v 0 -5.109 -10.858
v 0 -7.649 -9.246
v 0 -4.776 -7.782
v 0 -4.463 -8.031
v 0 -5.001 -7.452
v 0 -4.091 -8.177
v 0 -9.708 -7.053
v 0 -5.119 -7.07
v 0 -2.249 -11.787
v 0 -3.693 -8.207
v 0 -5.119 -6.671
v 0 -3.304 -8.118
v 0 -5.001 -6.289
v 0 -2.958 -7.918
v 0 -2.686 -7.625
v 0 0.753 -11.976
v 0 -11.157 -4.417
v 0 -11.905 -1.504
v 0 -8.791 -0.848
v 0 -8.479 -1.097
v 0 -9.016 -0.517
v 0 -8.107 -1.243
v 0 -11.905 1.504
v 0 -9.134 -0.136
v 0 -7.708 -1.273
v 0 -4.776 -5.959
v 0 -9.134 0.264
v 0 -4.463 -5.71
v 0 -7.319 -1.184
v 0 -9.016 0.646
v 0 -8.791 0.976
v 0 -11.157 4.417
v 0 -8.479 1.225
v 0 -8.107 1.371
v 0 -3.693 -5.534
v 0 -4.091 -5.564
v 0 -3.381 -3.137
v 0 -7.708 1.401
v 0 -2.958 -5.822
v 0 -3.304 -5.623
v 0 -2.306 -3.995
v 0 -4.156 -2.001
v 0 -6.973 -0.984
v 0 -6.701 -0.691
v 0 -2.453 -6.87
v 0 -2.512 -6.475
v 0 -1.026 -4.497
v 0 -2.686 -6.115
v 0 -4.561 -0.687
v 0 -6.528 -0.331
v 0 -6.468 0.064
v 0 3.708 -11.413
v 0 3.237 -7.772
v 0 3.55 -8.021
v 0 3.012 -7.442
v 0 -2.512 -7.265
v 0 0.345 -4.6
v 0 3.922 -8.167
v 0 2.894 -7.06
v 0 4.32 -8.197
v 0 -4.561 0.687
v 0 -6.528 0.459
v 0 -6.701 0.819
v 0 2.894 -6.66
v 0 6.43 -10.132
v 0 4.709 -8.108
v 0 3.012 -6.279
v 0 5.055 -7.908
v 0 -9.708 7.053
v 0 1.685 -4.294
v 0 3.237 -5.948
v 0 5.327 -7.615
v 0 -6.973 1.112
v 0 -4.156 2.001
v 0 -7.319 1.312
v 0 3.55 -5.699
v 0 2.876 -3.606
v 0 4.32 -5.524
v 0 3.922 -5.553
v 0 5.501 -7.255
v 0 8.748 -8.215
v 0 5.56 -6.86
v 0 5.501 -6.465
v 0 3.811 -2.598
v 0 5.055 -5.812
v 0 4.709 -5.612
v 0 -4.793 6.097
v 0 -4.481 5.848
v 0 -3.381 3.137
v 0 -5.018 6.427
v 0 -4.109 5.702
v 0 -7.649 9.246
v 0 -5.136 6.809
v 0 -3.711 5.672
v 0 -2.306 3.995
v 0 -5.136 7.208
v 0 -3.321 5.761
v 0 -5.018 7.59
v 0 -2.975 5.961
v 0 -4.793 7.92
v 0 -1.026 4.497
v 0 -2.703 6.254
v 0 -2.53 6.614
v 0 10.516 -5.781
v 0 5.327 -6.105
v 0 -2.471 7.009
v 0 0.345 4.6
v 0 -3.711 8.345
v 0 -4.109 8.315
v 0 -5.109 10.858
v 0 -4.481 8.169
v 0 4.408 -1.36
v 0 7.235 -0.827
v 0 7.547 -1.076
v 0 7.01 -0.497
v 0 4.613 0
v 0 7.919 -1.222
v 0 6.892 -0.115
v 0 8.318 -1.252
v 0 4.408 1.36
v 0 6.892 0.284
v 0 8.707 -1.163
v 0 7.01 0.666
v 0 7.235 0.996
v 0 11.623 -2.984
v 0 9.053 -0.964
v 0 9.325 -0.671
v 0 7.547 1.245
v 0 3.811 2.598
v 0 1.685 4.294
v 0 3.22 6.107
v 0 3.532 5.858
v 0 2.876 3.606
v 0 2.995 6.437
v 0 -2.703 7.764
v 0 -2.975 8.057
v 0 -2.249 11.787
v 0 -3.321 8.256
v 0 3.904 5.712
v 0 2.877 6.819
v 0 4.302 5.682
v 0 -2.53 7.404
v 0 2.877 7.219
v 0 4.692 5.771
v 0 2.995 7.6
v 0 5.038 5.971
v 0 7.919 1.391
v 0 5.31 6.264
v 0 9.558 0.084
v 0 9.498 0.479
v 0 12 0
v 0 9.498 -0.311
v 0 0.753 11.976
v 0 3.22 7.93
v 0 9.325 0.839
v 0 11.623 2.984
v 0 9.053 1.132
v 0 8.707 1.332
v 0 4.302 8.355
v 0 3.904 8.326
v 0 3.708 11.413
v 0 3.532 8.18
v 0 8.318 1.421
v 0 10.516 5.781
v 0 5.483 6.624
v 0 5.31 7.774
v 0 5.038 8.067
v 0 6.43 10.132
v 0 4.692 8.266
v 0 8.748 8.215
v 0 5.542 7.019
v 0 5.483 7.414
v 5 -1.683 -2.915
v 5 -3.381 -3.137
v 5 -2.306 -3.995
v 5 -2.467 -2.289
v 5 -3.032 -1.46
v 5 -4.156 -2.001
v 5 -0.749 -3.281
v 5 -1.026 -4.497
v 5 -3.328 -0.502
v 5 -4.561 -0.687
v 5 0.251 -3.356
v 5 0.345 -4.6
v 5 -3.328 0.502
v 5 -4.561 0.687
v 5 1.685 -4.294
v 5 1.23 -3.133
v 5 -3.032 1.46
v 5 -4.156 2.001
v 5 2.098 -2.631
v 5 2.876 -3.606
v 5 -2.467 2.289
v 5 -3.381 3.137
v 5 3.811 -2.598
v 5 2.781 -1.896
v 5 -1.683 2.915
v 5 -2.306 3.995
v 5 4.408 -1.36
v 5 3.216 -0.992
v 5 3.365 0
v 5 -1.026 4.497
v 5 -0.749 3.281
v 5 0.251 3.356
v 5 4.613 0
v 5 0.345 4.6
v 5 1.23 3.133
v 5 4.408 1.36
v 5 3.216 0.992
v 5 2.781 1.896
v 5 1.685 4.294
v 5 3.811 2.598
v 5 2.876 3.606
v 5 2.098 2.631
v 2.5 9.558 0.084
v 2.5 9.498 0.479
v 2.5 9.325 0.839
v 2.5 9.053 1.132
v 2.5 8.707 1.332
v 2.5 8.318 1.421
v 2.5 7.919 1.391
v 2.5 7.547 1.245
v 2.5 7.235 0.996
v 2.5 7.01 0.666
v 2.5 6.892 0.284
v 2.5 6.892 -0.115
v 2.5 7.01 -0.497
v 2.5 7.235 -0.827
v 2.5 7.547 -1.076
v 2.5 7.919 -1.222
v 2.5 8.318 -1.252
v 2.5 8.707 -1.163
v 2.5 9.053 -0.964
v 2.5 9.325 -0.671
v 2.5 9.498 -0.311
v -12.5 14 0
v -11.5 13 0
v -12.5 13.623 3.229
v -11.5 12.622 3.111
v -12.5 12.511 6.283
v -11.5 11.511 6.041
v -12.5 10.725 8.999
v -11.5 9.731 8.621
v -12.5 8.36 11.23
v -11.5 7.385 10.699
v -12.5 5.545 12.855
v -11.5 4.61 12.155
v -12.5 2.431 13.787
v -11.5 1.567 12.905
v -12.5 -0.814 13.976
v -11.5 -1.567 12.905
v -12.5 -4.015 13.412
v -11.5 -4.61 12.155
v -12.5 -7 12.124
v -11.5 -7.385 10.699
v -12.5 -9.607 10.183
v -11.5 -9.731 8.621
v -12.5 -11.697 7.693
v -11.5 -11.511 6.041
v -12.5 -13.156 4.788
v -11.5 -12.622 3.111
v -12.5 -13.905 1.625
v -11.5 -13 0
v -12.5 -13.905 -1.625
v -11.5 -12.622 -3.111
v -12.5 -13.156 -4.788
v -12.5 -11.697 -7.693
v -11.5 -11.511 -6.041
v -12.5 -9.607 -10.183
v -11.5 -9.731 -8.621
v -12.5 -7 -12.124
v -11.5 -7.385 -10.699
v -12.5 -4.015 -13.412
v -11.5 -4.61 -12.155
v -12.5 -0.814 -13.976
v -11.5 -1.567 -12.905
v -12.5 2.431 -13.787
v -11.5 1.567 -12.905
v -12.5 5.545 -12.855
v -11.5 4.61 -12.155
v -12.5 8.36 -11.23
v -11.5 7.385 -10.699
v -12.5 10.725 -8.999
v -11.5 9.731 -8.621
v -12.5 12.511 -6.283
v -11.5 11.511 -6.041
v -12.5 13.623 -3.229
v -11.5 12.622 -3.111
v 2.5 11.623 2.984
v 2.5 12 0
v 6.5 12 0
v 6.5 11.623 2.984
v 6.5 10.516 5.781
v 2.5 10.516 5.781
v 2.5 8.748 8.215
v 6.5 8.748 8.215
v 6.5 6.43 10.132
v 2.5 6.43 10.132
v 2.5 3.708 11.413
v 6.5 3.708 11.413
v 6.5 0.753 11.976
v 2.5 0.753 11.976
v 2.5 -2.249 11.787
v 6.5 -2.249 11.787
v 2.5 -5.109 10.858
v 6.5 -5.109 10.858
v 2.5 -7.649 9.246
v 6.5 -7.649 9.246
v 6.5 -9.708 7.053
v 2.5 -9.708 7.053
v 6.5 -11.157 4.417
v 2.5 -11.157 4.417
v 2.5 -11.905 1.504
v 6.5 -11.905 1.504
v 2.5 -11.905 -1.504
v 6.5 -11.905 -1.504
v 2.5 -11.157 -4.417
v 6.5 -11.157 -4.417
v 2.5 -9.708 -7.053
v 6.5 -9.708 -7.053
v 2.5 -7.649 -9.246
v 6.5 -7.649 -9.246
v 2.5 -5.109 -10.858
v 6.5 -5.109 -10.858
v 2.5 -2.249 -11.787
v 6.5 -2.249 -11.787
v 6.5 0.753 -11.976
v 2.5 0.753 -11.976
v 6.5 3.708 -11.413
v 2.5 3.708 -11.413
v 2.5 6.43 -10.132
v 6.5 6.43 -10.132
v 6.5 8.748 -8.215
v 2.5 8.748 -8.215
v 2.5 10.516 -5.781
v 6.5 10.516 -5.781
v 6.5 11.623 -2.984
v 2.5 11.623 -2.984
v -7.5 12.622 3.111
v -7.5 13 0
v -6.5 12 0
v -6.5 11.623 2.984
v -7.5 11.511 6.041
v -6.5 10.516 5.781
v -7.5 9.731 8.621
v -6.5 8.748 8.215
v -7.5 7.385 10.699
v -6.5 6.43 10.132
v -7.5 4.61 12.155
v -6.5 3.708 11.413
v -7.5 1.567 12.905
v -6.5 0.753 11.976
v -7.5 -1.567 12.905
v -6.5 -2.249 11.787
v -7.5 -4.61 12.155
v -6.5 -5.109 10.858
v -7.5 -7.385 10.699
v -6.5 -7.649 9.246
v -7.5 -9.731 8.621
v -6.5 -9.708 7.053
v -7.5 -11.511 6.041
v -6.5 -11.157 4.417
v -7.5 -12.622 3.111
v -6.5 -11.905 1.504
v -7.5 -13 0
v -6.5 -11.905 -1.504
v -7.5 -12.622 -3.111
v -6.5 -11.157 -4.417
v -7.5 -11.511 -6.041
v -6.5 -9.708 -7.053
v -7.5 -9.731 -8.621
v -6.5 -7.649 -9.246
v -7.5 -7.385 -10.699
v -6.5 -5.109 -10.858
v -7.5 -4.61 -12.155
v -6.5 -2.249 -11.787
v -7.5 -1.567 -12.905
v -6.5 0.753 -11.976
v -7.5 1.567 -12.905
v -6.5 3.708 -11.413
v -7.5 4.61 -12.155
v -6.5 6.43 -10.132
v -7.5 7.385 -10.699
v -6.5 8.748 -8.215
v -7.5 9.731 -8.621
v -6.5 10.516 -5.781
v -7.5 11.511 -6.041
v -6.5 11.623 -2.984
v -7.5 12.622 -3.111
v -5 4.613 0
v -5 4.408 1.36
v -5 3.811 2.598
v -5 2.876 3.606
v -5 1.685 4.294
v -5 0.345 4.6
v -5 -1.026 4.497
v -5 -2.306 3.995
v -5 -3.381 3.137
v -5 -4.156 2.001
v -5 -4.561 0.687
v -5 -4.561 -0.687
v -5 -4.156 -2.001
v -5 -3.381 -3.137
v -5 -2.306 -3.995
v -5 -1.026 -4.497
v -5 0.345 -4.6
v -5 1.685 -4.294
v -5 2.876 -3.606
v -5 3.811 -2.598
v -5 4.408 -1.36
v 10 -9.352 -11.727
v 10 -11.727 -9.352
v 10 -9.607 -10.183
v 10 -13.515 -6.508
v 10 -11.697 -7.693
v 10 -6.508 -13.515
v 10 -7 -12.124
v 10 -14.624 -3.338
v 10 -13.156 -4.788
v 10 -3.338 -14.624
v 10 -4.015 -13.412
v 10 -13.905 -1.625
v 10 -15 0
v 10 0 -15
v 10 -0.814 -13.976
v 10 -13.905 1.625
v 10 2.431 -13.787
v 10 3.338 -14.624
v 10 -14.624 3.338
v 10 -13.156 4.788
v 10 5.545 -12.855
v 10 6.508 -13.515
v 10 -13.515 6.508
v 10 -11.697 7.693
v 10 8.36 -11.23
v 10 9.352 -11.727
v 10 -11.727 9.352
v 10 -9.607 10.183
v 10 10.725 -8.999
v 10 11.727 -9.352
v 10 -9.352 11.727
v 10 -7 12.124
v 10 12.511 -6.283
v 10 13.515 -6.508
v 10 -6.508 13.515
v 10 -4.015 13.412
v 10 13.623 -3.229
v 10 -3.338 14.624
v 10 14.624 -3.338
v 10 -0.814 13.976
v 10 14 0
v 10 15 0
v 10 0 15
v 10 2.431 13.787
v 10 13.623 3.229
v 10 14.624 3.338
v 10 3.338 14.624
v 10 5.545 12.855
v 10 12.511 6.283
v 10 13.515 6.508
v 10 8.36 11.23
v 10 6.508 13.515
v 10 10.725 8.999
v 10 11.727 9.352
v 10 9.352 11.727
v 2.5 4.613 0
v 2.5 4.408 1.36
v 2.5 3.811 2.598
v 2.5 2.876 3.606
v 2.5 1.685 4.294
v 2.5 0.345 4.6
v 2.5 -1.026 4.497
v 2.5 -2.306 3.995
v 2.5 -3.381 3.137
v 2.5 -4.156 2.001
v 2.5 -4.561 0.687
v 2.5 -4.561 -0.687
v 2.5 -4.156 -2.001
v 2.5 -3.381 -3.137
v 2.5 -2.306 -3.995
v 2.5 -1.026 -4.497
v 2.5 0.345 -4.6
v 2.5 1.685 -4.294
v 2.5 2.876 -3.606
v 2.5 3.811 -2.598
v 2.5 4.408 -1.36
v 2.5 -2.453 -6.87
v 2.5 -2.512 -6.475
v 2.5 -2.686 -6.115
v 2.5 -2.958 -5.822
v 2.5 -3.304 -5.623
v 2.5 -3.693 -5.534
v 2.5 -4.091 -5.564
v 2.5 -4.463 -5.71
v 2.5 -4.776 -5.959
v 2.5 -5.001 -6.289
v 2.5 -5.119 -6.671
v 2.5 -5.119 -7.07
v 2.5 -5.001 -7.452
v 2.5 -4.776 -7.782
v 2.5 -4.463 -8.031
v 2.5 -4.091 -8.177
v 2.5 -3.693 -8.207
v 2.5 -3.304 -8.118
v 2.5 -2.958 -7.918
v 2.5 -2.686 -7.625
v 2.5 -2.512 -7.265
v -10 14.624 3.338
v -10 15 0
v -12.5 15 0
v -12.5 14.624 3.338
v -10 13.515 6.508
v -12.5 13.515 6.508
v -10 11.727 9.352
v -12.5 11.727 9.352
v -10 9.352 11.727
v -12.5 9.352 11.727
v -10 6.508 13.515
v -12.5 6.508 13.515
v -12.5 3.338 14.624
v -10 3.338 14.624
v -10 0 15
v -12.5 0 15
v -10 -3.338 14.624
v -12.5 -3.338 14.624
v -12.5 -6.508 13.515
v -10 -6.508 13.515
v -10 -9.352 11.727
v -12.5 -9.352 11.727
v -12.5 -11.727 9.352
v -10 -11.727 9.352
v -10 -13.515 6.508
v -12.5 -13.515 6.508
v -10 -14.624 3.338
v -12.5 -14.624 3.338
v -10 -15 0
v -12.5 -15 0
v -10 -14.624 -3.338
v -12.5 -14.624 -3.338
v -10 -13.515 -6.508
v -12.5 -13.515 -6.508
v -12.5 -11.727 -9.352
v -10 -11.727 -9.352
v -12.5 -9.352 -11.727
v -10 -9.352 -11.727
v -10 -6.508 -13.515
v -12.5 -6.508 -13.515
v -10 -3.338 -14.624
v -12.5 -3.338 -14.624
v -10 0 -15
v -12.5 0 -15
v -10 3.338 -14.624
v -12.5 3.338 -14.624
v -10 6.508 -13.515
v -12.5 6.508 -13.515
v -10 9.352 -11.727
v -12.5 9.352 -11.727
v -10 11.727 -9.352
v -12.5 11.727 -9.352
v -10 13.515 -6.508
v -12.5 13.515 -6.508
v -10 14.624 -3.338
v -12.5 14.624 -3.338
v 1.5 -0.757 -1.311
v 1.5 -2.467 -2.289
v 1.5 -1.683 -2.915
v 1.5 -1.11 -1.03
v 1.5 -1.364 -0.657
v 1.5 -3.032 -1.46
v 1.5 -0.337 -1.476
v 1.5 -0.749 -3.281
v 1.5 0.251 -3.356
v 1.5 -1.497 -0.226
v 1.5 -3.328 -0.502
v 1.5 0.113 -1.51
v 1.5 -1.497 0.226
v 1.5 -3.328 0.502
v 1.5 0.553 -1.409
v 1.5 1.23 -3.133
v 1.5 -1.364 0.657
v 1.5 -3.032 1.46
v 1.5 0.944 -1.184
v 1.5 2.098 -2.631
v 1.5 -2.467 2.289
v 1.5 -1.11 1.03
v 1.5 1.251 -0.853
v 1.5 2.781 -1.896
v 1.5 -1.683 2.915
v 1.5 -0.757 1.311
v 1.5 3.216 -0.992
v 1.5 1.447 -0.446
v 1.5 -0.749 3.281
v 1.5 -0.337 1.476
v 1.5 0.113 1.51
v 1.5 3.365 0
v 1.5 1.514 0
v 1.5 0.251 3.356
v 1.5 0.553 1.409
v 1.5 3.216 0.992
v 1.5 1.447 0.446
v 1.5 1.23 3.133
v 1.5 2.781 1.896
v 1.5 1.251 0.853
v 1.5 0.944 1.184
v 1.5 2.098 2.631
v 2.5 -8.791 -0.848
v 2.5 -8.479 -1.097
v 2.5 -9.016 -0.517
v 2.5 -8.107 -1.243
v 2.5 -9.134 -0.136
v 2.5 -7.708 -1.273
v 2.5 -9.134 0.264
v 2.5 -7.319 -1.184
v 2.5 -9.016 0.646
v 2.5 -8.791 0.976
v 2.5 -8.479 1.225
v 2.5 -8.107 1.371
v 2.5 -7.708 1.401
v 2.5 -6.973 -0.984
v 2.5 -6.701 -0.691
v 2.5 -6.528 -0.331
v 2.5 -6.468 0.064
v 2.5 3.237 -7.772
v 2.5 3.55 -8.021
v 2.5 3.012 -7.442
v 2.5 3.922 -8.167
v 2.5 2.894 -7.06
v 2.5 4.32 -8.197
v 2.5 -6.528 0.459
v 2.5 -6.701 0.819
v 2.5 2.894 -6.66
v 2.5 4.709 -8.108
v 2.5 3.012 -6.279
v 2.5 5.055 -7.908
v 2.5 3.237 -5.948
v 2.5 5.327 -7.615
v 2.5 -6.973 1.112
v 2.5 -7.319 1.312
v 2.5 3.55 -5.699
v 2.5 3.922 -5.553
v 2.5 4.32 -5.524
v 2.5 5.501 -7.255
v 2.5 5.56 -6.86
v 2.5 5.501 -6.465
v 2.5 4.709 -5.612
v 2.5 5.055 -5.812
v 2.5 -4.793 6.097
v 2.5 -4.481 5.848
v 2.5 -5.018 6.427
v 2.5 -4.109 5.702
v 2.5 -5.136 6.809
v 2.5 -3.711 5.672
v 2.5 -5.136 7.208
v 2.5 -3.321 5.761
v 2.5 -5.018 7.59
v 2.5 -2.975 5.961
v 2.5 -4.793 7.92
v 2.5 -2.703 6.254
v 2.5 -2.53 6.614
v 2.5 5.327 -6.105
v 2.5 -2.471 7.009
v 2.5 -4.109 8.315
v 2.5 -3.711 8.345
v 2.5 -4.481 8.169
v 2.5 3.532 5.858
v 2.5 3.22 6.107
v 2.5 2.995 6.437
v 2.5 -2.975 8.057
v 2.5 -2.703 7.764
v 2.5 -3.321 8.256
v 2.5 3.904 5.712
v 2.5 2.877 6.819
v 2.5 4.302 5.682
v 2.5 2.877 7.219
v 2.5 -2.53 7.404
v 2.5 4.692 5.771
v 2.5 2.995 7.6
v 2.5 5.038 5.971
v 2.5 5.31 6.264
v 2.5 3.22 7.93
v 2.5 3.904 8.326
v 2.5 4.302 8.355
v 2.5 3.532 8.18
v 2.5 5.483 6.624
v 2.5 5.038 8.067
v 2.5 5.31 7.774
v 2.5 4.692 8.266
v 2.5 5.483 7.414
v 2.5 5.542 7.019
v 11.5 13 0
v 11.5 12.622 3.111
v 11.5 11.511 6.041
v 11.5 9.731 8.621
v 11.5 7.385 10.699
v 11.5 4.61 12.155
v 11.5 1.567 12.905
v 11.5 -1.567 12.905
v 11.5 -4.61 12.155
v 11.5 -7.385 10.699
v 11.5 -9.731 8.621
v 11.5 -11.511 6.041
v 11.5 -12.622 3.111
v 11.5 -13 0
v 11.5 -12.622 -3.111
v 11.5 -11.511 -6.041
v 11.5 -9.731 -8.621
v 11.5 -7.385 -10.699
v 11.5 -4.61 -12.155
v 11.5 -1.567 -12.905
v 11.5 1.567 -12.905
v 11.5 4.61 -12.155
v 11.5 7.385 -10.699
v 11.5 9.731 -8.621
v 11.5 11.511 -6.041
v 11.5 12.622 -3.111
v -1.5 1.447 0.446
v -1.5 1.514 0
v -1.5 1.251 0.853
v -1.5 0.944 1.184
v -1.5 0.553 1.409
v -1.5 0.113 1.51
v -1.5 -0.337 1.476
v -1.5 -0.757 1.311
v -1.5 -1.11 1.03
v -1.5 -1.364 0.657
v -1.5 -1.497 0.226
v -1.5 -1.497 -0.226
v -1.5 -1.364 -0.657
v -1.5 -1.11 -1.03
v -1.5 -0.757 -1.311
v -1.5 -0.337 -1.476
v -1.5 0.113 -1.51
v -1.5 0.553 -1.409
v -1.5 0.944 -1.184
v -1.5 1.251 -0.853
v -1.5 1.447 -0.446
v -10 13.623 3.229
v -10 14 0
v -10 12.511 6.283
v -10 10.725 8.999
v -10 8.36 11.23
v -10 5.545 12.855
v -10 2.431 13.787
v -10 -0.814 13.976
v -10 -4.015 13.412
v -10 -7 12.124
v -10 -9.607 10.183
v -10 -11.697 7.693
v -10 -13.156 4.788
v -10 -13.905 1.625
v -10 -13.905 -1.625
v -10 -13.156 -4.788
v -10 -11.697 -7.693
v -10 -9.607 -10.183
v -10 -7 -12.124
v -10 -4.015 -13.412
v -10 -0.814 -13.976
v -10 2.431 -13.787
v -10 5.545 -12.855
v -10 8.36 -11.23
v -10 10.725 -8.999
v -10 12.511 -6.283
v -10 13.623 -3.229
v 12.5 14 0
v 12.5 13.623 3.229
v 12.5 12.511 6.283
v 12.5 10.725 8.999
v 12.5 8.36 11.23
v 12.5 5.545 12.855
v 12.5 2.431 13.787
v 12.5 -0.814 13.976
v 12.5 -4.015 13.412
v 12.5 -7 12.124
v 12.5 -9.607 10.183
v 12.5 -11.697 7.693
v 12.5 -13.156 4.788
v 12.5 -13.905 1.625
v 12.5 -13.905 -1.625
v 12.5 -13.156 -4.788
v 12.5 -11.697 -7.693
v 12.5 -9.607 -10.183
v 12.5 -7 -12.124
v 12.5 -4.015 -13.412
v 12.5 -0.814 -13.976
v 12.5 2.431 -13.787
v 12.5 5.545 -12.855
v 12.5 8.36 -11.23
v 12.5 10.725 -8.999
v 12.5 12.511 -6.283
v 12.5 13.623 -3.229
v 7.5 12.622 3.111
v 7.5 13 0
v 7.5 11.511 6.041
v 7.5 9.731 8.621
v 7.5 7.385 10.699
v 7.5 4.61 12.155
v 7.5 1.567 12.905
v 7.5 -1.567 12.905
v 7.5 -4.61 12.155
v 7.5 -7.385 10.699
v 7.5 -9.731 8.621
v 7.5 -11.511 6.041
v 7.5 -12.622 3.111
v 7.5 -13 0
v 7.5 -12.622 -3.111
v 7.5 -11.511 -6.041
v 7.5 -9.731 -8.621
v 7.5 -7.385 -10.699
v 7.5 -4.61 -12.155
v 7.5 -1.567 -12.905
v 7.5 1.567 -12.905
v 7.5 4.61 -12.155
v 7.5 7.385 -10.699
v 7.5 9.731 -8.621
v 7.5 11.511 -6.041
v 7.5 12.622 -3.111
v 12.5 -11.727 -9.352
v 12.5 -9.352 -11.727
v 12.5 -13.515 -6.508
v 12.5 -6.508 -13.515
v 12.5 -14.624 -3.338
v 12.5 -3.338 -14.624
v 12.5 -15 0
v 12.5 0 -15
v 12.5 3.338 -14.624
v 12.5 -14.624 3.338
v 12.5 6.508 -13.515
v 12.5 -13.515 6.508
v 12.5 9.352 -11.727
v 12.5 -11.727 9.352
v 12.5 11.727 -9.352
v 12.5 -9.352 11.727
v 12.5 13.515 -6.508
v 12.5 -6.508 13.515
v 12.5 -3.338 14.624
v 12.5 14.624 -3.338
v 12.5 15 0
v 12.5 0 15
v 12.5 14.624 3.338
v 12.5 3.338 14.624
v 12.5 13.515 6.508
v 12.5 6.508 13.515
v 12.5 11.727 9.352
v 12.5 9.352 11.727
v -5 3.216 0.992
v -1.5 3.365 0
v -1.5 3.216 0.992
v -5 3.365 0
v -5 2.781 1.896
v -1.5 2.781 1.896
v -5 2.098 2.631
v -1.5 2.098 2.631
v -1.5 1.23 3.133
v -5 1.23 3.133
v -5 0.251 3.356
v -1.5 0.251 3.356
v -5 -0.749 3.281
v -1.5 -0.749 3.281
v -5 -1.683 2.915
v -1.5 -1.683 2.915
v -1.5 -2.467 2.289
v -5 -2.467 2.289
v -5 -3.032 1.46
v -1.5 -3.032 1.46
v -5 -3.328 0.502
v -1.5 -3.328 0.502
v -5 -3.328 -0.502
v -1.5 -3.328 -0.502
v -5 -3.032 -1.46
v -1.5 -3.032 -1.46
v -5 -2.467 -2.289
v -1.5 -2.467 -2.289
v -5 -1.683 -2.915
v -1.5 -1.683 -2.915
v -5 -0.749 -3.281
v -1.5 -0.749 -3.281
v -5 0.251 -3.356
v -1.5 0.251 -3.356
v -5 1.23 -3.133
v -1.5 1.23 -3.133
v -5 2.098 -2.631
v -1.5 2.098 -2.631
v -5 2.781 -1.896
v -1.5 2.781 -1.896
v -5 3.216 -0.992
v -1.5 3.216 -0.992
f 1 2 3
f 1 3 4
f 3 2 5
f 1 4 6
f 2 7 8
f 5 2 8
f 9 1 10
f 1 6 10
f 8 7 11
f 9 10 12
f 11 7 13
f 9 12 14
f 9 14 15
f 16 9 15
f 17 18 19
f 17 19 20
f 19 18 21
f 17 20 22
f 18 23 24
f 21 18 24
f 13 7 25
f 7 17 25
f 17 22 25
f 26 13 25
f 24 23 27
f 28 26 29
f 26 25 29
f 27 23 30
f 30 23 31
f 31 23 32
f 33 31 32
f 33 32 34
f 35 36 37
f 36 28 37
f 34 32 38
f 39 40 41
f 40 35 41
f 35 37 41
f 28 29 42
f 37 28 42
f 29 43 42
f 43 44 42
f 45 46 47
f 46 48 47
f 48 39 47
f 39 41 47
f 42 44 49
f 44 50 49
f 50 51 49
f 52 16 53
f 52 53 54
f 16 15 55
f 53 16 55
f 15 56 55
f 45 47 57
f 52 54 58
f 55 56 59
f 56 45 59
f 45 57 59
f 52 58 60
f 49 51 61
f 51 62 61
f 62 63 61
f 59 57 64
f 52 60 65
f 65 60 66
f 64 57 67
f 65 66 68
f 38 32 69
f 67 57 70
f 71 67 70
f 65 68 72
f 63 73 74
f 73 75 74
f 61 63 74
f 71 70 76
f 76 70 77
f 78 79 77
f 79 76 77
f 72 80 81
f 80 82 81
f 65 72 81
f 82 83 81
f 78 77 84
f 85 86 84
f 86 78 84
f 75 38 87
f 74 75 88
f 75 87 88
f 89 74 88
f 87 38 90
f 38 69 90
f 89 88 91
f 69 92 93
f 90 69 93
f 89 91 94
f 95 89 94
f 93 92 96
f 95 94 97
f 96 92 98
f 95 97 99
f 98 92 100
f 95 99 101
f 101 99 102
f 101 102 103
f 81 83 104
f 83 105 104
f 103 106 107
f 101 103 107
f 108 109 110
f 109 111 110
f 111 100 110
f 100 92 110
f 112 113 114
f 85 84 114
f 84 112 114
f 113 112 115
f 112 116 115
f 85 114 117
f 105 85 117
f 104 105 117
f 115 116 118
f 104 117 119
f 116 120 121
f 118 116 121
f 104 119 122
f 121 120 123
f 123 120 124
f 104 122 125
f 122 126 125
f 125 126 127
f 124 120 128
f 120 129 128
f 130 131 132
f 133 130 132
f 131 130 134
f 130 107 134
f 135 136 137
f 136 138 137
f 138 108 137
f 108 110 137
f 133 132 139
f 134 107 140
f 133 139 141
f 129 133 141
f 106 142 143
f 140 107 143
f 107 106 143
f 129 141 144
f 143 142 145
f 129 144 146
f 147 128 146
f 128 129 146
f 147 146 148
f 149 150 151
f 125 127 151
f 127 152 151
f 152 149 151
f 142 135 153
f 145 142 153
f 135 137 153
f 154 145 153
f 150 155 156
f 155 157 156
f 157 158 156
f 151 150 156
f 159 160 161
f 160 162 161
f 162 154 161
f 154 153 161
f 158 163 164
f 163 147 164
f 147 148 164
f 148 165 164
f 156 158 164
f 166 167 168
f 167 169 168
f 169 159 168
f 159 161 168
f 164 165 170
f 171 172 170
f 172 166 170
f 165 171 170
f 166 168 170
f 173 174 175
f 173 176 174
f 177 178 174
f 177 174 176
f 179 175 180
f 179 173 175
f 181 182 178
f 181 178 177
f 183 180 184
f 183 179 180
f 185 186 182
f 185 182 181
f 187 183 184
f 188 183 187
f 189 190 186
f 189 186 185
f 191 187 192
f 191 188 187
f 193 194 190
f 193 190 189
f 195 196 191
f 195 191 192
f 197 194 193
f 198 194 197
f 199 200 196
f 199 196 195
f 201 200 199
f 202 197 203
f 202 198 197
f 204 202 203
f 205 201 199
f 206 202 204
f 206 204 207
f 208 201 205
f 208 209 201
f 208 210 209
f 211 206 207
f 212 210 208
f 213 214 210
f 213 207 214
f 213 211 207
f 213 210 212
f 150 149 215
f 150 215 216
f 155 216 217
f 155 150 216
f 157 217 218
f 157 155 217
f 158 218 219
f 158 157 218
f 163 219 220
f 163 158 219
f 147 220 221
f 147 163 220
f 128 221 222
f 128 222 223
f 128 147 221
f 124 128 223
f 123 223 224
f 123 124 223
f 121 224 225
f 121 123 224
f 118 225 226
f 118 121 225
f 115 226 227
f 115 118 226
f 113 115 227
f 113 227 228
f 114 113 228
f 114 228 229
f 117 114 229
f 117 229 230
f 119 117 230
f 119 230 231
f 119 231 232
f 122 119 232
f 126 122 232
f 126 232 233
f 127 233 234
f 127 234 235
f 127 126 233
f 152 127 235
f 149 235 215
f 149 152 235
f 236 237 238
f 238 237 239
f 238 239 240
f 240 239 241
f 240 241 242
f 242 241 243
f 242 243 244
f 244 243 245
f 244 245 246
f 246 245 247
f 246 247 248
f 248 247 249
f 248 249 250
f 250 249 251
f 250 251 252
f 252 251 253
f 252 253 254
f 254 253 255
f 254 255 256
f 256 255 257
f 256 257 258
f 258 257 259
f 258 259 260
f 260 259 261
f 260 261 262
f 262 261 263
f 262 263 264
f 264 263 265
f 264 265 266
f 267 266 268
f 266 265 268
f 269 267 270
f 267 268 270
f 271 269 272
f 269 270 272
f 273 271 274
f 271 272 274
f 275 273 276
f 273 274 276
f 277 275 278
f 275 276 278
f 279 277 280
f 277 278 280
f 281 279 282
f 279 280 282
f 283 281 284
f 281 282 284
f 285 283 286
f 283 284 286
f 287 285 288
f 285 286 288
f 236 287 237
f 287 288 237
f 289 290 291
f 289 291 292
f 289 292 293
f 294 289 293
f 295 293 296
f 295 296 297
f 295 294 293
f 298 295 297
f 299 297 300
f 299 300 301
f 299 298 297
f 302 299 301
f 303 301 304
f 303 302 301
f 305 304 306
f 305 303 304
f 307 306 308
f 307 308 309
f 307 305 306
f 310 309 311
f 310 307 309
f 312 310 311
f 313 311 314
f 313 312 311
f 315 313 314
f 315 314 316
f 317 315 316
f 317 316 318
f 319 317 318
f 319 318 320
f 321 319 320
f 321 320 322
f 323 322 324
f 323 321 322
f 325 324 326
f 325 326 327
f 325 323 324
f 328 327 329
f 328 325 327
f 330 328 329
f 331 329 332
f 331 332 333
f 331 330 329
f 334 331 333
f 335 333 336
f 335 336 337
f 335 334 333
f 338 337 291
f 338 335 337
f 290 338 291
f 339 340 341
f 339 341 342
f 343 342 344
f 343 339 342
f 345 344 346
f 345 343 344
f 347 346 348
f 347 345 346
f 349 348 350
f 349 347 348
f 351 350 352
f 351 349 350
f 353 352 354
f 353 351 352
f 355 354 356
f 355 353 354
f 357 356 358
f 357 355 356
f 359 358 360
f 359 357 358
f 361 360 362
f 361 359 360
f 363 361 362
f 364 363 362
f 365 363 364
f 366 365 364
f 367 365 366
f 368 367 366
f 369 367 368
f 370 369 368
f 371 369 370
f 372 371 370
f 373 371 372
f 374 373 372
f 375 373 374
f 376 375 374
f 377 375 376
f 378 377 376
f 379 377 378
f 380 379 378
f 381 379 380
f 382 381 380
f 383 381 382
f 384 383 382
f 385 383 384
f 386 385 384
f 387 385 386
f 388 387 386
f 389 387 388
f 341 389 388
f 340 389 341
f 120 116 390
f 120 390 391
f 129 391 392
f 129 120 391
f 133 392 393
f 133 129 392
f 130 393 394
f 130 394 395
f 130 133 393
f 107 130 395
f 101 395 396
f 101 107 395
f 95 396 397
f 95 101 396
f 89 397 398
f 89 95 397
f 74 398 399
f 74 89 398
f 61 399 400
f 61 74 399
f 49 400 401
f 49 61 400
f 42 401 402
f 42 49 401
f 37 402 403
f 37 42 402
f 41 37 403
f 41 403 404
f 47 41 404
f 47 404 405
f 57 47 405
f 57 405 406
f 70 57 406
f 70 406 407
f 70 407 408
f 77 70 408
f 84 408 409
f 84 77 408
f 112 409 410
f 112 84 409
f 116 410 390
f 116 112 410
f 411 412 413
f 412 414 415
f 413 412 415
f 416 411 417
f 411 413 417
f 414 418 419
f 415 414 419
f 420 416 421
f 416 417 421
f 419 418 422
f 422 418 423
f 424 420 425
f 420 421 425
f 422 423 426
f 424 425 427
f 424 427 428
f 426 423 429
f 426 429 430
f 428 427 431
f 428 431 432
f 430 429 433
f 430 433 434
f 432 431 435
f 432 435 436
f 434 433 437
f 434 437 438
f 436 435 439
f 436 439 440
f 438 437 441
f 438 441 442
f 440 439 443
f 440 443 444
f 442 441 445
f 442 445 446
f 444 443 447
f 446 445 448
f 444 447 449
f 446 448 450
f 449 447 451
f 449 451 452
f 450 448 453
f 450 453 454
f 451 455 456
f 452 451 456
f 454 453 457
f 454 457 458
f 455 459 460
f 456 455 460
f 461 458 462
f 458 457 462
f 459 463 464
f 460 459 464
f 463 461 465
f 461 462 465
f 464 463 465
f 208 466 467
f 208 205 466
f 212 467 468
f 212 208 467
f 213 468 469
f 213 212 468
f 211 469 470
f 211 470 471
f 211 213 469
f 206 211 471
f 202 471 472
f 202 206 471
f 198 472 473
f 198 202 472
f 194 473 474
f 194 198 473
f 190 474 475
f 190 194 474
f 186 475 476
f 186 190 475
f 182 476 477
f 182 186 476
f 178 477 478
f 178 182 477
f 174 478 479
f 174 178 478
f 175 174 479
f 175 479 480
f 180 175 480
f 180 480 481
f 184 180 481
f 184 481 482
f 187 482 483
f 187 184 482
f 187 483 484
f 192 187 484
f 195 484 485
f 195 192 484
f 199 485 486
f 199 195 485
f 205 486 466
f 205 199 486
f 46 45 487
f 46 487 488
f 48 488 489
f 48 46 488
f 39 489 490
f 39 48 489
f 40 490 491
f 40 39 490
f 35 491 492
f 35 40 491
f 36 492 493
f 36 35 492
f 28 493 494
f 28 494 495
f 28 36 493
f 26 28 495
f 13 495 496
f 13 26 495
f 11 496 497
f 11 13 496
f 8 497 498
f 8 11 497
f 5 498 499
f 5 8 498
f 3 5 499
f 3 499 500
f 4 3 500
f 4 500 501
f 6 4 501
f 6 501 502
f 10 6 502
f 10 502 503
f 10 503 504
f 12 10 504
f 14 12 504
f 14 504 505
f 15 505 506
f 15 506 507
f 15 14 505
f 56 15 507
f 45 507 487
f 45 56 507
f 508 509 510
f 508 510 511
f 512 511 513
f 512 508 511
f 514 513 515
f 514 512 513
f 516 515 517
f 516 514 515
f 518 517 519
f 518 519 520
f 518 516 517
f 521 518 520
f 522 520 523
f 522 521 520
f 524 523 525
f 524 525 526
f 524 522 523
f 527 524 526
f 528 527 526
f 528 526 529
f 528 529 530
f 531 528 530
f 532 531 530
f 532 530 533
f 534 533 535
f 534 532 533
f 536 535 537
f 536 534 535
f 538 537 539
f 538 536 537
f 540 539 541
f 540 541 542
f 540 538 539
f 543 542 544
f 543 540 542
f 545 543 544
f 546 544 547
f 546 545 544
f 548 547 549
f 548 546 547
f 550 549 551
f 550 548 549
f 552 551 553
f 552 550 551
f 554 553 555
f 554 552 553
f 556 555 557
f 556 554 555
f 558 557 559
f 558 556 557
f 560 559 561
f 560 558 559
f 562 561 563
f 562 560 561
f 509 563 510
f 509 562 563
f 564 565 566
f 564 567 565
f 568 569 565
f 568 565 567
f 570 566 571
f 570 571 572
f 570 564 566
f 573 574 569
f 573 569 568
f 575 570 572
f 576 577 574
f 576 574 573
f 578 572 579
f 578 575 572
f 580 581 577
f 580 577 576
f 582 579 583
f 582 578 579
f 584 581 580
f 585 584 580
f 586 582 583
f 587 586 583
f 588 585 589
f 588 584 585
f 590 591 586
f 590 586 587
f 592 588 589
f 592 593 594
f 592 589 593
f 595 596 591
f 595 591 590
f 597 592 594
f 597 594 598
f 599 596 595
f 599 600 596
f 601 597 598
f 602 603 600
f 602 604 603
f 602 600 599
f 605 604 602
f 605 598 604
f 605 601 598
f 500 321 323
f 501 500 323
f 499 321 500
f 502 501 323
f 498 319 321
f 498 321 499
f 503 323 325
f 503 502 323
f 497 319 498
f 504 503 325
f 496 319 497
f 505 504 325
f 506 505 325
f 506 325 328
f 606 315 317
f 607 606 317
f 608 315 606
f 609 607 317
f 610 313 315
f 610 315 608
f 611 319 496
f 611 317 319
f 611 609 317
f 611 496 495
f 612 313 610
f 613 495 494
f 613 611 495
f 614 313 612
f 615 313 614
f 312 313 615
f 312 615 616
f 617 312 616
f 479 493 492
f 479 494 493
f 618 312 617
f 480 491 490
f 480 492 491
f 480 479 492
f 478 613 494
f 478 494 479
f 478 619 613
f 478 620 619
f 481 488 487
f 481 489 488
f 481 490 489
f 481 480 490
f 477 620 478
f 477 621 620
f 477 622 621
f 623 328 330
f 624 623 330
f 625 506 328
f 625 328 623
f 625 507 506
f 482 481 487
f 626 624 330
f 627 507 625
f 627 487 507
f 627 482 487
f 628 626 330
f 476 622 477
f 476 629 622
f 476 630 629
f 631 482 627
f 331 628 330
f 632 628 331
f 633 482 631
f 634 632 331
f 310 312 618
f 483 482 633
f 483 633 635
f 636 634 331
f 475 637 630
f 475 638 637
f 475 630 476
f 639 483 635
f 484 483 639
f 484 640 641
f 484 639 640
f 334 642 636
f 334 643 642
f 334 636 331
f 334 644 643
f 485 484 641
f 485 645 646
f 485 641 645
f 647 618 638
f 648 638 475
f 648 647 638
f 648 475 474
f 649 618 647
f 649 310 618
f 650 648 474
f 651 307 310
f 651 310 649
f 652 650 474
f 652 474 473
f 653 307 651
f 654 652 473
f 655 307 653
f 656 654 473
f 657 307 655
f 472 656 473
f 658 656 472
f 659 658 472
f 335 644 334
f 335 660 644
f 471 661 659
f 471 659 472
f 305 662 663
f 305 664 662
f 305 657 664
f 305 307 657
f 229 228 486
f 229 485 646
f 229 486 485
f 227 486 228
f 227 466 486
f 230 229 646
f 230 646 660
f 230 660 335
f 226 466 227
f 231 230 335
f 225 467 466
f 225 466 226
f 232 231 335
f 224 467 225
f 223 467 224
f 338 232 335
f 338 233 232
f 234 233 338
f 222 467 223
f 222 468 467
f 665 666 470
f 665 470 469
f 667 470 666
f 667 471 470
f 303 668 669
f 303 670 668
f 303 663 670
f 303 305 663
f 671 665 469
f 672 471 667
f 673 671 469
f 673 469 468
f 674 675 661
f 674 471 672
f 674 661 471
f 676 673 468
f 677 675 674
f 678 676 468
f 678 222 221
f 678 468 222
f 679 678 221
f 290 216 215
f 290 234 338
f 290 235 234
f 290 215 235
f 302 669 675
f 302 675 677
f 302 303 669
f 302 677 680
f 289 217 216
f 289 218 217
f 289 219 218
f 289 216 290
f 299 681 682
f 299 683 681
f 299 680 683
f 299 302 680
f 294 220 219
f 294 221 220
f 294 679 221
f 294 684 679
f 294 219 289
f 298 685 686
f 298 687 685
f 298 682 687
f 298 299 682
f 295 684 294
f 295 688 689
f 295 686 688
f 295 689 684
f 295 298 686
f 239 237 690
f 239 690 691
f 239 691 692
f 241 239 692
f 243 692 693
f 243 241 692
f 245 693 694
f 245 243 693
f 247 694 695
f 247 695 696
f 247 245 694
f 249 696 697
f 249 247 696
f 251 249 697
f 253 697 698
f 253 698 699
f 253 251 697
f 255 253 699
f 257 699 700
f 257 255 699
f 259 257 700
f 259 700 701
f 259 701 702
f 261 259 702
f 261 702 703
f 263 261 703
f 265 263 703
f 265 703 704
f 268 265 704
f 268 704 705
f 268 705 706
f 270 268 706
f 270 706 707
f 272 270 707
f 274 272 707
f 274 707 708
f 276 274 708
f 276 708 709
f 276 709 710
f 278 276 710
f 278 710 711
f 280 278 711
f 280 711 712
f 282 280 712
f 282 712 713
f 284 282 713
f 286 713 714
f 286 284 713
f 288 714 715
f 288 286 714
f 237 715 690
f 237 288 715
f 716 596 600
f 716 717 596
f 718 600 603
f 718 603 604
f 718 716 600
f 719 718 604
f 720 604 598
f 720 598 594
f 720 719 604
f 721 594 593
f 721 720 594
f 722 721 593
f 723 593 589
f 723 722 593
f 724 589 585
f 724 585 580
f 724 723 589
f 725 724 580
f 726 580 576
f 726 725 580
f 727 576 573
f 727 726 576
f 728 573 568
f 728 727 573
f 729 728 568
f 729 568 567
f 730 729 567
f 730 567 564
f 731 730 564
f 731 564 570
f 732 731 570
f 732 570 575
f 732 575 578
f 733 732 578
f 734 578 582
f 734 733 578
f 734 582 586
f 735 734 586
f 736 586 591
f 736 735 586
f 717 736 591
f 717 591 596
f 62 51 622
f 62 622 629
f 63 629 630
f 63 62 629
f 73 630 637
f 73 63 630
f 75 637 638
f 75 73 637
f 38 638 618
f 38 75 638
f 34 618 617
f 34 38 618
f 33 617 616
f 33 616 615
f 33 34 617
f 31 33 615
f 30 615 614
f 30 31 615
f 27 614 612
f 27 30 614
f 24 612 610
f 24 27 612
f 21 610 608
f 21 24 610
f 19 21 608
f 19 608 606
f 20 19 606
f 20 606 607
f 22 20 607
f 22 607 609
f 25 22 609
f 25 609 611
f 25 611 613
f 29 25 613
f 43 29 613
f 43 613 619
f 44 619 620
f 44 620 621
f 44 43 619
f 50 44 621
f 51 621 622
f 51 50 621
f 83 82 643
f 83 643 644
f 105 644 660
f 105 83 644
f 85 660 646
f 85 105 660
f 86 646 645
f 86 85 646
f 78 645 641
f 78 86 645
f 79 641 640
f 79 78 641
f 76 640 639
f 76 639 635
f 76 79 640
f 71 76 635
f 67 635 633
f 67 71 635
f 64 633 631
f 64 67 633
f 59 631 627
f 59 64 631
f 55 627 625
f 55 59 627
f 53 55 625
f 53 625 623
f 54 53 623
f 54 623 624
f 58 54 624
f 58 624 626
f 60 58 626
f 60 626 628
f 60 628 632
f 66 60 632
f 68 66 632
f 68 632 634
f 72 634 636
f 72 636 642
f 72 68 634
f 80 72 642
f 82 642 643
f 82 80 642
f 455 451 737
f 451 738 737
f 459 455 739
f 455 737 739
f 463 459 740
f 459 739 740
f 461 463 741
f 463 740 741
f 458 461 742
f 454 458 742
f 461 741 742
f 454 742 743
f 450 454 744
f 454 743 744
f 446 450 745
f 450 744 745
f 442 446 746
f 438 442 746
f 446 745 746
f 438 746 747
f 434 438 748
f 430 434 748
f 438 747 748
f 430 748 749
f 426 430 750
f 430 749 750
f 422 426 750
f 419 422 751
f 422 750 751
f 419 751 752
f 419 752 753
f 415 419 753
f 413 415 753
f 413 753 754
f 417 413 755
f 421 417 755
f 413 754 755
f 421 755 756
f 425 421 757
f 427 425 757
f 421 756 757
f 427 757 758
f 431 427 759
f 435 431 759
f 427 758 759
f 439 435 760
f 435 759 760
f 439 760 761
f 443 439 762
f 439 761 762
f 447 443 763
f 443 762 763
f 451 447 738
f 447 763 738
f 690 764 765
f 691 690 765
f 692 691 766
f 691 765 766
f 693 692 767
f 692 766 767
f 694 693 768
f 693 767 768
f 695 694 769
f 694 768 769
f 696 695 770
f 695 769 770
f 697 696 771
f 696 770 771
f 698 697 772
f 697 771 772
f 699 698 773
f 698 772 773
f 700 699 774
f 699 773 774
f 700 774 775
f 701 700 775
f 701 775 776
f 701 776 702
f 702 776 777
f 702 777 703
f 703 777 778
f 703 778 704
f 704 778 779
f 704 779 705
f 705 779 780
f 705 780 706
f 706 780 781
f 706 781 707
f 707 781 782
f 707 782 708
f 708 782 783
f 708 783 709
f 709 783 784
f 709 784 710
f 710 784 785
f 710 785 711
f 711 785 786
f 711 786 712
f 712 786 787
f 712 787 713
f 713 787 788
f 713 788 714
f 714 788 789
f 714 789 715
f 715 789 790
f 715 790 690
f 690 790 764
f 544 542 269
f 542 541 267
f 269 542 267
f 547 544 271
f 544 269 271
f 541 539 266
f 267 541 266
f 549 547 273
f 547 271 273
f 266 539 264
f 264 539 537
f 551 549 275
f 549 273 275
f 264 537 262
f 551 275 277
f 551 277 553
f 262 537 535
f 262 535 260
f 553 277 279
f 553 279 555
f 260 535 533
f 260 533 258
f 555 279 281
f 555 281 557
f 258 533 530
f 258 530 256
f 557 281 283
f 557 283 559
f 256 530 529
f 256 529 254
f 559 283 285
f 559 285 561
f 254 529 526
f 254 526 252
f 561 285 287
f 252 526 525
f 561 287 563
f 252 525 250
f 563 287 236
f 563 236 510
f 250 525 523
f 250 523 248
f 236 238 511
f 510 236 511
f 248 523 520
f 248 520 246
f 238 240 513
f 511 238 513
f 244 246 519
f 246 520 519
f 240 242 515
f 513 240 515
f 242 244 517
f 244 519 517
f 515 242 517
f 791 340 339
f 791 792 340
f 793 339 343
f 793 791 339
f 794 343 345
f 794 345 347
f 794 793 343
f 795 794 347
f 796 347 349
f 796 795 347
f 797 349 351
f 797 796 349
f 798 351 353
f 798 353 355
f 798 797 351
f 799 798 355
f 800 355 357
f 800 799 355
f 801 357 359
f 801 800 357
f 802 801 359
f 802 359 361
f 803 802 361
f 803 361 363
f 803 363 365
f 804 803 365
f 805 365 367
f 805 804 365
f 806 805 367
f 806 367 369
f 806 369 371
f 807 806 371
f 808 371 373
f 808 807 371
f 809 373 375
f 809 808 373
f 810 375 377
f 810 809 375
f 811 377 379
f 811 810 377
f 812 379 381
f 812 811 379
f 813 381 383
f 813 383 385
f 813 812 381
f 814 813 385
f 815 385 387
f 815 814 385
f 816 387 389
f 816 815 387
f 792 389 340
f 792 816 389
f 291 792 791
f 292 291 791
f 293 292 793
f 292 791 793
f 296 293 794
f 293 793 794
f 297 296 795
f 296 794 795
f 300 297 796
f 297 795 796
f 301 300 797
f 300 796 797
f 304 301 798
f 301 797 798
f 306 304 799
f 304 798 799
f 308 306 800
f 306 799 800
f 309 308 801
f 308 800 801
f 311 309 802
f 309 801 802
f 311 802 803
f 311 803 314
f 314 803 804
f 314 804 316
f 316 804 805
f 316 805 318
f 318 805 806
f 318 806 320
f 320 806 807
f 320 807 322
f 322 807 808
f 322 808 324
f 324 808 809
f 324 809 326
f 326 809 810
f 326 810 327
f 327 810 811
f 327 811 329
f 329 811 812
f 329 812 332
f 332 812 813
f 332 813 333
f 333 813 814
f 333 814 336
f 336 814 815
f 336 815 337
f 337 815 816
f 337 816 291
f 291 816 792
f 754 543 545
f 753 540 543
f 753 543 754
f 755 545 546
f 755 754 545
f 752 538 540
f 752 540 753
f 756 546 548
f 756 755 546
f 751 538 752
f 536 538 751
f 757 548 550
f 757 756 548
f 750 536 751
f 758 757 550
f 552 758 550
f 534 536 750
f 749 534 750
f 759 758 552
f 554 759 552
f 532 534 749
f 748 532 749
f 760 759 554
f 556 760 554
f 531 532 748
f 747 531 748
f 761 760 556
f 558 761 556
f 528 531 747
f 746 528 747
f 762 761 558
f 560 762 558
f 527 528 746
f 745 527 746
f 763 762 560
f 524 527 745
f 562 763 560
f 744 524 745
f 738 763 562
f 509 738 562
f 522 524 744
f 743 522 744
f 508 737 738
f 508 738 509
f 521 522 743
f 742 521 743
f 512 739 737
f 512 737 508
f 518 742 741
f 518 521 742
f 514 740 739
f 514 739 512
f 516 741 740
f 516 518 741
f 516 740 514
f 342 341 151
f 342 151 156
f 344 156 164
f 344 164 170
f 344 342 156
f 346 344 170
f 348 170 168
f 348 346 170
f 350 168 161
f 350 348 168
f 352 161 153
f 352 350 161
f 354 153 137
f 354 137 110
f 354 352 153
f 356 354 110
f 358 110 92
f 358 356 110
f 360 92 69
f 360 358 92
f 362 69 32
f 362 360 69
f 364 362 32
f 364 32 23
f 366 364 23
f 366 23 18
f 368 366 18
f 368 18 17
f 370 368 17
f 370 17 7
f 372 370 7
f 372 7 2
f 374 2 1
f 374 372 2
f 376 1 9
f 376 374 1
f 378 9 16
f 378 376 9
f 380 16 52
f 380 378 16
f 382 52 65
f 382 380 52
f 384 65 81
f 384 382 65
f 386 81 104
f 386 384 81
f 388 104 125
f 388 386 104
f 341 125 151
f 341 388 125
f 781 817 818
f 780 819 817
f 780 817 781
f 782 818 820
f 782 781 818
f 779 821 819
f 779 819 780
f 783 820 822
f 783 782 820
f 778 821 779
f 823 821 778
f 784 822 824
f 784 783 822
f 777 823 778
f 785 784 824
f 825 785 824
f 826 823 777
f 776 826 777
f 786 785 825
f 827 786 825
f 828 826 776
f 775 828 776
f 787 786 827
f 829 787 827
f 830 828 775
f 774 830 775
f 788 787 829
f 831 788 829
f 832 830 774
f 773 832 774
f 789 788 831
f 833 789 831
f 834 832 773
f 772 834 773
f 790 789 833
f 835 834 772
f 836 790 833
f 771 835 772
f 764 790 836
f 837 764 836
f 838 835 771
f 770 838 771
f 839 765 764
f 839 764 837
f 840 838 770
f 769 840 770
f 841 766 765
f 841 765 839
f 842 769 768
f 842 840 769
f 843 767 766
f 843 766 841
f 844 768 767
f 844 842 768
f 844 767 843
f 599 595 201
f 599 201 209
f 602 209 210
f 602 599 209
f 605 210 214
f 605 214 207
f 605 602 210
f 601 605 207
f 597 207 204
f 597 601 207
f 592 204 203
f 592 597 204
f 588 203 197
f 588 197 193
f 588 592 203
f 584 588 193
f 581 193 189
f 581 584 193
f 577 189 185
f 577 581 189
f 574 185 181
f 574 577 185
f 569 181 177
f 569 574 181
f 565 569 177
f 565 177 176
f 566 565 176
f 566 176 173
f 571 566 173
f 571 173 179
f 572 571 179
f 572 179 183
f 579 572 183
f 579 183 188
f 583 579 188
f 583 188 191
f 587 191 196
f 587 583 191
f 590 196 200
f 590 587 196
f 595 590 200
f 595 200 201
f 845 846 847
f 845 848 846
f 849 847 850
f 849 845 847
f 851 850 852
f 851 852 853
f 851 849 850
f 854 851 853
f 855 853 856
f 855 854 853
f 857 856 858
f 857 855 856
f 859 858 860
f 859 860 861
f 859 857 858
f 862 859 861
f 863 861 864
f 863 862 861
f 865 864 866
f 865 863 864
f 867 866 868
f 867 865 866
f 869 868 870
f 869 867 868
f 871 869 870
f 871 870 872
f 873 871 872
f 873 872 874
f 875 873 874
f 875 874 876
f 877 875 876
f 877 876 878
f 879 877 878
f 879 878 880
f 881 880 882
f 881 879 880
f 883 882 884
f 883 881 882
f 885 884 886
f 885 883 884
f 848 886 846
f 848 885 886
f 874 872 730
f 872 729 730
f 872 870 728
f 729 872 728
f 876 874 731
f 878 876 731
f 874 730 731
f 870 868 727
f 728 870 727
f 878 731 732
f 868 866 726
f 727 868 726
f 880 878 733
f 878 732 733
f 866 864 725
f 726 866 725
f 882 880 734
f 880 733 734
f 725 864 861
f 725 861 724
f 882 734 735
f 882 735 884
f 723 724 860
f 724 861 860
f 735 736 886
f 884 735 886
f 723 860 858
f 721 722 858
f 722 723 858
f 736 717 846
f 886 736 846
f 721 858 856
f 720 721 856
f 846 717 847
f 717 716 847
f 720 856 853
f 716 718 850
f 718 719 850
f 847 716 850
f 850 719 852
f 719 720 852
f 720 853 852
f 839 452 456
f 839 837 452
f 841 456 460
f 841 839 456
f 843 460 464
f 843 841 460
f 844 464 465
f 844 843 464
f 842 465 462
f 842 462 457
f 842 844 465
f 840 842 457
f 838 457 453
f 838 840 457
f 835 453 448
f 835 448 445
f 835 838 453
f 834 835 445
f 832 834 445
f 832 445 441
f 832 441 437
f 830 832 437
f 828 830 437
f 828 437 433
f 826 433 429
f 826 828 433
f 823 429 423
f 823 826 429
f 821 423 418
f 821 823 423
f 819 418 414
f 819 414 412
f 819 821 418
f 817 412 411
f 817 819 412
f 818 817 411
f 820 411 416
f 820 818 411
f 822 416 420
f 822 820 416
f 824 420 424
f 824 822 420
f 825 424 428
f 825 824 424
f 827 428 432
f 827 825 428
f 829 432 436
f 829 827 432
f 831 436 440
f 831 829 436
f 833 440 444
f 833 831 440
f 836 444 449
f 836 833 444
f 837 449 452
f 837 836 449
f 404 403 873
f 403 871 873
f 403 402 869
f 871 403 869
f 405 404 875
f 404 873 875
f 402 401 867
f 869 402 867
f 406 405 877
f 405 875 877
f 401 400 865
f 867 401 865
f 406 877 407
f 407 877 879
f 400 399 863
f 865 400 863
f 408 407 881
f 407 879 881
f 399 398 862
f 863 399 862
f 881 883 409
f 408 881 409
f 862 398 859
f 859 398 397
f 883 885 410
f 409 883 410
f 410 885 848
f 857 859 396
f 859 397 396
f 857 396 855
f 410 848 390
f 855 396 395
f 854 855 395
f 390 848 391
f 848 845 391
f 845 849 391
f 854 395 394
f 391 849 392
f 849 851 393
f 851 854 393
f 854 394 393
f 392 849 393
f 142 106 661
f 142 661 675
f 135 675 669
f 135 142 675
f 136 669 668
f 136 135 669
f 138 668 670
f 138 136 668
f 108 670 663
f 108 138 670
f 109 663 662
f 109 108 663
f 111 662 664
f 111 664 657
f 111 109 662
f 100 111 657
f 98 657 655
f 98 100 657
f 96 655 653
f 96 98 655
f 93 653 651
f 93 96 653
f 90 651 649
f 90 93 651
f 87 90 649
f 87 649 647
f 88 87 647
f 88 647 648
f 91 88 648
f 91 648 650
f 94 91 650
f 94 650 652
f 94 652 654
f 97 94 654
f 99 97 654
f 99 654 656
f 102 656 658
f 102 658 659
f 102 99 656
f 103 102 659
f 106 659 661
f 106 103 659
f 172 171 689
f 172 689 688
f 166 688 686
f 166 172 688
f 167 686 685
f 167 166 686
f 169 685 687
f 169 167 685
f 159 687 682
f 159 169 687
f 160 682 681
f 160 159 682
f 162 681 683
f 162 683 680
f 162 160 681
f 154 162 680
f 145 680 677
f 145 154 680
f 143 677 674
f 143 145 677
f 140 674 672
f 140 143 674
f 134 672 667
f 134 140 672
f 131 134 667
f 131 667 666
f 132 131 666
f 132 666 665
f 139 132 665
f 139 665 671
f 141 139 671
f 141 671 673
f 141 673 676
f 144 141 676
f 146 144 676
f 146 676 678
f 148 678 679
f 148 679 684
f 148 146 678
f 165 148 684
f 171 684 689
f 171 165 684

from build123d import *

# Parameters (mm, degrees)
F0_R     = 15
F0_R_2   = 14
F0_R_3   = 13
F1_DEPTH = 12.5
F0_R_4   = 12
F2_DEPTH = 7.5
F0_R_5   = 1.340335668
F0_R_6   = 4.6127208632
F3_DEPTH = 2.5
F0_R_7   = 3.3654242234
F4_DEPTH = 5
F0_R_8   = 1.513947391
F5_DEPTH = 1.5
F6_DEPTH = 10
F7_SIZE  = 0.99999
F8_SIZE  = 1


# Not quite as in the source:
# - a fillet or chamfer is up to 0.001 mm smaller than in the source, because OpenCascade refuses the exact size


with BuildPart() as f1:
    # F0 (on Right) → F1 (new body, symmetric)
    with BuildSketch(Plane.YZ):
        Circle(F0_R)
        Circle(F0_R_2, mode=Mode.SUBTRACT)
        Circle(F0_R_2)
        Circle(F0_R_3, mode=Mode.SUBTRACT)
    extrude(amount=F1_DEPTH, both=True)

    # F0 (on Right) → F6 (cut, symmetric)
    with BuildSketch(Plane.YZ):
        Circle(F0_R)
        Circle(F0_R_2, mode=Mode.SUBTRACT)
    extrude(amount=F6_DEPTH, both=True, mode=Mode.SUBTRACT)

    # F8
    f8_edges = [f1.edges().sort_by_distance(p)[0] for p in [
        (-12.5, -13, 0),
        (12.5, -13, 0),
    ]]
    chamfer(f8_edges, length=F8_SIZE)


with BuildPart() as f2:
    # F0 (on Right) → F2 (new body, symmetric)
    with BuildSketch(Plane.YZ):
        Circle(F0_R_3)
        Circle(F0_R_4, mode=Mode.SUBTRACT)
    extrude(amount=F2_DEPTH, both=True)

    # F0 (on Right) → F3 (join)
    with BuildSketch(Plane.YZ):
        Circle(F0_R_4)
        with Locations((-3.7932281848, -6.8703168072)):
            Circle(F0_R_5, mode=Mode.SUBTRACT)
        with Locations((4.2197729637, -6.8601384378)):
            Circle(F0_R_5, mode=Mode.SUBTRACT)
        with Locations((-7.8085434855, 0.0640565633)):
            Circle(F0_R_5, mode=Mode.SUBTRACT)
        with Locations((-3.8108576376, 7.0086083031)):
            Circle(F0_R_5, mode=Mode.SUBTRACT)
        Circle(F0_R_6, mode=Mode.SUBTRACT)
        with Locations((4.2021435108, 7.0187866725)):
            Circle(F0_R_5, mode=Mode.SUBTRACT)
        with Locations((8.2174588115, 0.084413302)):
            Circle(F0_R_5, mode=Mode.SUBTRACT)
    extrude(amount=F3_DEPTH)

    # F0 (on Right) → F4 (join, symmetric)
    with BuildSketch(Plane.YZ):
        Circle(F0_R_6)
        Circle(F0_R_7, mode=Mode.SUBTRACT)
    extrude(amount=F4_DEPTH, both=True)

    # F0 (on Right) → F5 (join, symmetric)
    with BuildSketch(Plane.YZ):
        Circle(F0_R_7)
        Circle(F0_R_8, mode=Mode.SUBTRACT)
    extrude(amount=F5_DEPTH, both=True)

    # F7 (size 1 in the source; OpenCascade refuses exactly that, so slightly less here)
    f7_edges = [f2.edges().sort_by_distance(p)[0] for p in [
        (7.5, -12, 0),
        (-7.5, -12, 0),
    ]]
    chamfer(f7_edges, length=F7_SIZE)


solid = Compound([f1.part, f2.part])
